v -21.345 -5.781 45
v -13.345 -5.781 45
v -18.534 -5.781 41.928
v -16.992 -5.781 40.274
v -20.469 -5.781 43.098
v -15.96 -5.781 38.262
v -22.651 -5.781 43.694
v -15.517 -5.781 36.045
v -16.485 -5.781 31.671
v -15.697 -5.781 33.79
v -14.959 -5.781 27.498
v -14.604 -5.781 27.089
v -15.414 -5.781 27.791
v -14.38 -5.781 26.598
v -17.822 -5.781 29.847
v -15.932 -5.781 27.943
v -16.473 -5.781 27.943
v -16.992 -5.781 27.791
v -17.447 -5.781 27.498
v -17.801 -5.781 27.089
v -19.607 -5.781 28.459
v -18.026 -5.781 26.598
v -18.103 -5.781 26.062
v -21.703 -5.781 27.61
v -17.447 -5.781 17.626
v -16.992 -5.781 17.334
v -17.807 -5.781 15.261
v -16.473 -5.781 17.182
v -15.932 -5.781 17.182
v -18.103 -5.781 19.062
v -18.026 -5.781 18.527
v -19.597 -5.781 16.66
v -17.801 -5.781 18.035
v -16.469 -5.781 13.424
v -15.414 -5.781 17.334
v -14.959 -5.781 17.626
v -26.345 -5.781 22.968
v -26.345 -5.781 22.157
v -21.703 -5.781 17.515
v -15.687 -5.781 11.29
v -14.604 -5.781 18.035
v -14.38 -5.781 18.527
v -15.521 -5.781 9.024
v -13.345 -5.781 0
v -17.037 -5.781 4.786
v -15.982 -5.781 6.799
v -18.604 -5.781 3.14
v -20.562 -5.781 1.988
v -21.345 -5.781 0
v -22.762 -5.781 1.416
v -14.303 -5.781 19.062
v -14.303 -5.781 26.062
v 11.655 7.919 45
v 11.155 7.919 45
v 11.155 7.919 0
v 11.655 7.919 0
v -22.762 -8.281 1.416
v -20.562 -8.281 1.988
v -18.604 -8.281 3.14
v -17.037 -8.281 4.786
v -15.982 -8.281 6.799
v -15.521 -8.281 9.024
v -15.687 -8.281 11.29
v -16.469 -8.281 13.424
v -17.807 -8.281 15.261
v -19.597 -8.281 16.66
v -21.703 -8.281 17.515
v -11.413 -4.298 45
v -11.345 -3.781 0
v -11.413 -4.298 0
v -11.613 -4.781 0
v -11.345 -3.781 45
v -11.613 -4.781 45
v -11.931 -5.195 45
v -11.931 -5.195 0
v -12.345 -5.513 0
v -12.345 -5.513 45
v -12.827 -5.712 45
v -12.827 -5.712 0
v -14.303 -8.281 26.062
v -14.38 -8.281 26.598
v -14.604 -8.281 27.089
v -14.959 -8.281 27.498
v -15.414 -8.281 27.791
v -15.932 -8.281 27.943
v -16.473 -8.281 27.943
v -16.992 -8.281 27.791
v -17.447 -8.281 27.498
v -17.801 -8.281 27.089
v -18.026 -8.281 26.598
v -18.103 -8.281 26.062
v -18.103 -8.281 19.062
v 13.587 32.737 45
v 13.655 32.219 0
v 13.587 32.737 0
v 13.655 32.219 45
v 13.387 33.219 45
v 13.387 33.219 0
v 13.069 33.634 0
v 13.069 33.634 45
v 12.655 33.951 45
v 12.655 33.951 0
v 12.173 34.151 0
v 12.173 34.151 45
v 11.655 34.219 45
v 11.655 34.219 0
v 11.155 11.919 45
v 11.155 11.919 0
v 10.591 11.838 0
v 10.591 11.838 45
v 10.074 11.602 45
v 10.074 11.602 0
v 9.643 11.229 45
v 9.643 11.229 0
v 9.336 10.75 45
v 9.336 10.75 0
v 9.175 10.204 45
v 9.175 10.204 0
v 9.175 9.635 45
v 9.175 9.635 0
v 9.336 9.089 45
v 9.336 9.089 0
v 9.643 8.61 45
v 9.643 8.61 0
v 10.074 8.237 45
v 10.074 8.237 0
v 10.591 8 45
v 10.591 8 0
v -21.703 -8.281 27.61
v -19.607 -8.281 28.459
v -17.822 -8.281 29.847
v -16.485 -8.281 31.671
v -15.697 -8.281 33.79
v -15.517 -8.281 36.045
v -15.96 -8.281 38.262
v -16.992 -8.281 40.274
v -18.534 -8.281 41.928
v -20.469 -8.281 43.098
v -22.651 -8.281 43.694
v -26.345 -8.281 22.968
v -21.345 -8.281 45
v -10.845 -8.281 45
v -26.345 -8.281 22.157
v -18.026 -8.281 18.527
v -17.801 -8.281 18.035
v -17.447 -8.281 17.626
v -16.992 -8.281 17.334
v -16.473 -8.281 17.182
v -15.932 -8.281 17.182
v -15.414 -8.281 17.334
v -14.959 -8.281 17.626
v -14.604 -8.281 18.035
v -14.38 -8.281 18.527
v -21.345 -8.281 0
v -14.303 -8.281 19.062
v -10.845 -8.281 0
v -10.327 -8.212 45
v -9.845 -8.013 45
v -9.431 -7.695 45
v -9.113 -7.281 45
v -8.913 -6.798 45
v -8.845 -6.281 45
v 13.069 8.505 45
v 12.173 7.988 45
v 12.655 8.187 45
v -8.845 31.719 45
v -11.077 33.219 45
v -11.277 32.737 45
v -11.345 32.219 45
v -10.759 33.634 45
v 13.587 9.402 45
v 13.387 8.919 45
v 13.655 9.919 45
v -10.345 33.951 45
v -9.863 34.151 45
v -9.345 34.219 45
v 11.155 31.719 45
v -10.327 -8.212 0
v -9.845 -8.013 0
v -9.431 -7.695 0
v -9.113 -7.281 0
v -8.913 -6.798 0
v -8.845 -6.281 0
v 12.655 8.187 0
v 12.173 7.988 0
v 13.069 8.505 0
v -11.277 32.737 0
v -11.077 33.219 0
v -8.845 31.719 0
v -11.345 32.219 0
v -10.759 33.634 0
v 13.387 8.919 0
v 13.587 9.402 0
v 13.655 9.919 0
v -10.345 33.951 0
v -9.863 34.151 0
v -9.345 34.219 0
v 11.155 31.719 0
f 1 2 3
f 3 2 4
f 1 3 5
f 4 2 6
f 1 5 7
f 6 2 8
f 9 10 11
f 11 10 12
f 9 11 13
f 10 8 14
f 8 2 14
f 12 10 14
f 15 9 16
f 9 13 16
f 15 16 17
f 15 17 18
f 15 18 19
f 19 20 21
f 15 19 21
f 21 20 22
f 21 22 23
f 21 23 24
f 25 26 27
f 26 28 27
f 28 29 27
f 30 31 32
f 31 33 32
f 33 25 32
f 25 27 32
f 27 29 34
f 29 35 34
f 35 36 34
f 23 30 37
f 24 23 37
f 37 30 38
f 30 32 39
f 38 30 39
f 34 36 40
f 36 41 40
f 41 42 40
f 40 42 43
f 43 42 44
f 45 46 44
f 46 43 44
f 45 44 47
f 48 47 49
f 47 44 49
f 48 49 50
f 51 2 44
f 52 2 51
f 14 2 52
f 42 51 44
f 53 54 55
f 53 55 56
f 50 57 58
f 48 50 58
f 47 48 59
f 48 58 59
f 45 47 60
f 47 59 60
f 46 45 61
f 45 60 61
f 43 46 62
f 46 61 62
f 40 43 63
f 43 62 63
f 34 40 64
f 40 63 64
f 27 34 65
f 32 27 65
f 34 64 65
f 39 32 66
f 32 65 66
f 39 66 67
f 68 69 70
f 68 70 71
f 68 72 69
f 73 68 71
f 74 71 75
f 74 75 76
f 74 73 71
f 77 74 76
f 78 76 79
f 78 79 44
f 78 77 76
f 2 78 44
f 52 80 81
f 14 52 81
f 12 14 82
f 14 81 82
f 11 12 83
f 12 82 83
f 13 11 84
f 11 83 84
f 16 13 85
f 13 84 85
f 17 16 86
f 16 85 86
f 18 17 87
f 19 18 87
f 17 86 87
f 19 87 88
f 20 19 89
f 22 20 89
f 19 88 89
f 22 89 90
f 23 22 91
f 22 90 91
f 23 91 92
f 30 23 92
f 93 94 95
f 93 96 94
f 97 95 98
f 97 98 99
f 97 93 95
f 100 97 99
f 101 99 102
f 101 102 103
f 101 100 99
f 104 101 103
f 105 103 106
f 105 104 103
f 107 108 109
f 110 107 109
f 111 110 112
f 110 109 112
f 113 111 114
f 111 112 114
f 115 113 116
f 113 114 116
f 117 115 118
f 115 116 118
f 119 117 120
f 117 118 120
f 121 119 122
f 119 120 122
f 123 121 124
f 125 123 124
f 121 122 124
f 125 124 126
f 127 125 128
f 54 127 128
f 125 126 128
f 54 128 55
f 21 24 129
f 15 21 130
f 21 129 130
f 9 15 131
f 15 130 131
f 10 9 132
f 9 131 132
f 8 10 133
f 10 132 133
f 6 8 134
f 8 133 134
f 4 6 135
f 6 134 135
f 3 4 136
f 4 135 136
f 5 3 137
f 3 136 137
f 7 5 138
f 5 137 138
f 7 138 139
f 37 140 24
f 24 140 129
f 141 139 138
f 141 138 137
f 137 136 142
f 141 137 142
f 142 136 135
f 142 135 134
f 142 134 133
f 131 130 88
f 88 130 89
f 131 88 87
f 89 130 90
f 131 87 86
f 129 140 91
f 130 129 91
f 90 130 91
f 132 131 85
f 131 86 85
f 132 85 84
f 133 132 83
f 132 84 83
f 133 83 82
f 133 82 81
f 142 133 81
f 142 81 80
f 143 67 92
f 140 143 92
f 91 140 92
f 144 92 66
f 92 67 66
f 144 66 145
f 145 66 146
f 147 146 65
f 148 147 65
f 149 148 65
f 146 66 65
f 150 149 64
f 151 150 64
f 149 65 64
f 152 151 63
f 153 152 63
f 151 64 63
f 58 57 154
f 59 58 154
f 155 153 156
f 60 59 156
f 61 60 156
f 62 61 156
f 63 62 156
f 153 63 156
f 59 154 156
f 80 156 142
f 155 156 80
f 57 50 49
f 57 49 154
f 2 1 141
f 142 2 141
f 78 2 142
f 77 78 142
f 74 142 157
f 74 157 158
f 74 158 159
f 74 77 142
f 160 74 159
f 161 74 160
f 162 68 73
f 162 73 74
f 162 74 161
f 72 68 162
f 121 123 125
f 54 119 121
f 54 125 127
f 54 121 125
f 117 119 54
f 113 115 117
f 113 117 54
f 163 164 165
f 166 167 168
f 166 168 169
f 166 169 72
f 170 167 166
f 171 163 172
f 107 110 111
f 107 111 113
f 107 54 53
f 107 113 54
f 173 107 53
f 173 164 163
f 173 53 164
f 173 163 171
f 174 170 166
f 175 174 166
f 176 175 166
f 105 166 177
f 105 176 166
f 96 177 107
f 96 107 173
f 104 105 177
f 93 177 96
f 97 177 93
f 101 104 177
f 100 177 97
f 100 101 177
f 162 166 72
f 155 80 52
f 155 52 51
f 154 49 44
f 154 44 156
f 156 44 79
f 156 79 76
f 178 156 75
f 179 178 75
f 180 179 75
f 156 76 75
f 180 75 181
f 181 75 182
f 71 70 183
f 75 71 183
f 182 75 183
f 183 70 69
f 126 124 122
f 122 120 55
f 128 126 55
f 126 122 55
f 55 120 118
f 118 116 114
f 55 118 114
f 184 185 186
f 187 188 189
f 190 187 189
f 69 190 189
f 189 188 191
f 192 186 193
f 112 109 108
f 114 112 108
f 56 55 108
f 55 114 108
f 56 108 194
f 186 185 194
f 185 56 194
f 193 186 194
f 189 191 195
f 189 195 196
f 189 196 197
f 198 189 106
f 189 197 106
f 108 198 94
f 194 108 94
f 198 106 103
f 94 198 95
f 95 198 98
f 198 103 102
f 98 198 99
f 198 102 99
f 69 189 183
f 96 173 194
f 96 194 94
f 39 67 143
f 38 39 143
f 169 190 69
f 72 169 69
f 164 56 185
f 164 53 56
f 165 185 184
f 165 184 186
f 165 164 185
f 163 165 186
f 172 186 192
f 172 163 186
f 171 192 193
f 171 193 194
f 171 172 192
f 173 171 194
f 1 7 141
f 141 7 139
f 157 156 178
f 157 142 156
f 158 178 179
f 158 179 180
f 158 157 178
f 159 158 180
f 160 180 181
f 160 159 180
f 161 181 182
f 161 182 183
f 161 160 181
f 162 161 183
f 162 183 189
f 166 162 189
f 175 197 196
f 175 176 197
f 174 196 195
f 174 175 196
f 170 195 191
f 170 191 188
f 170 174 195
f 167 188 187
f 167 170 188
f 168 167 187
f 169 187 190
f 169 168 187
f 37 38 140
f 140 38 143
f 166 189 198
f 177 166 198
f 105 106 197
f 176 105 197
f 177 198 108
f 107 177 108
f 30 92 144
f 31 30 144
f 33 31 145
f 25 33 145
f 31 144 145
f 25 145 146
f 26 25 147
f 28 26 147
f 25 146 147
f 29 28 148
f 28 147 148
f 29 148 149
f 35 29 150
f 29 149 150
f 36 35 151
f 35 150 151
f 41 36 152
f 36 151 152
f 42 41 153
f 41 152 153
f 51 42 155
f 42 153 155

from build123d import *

# Parameters (mm, degrees)
PAD_DEPTH       = 45
FILLET_R        = 2
CHAMFER_SIZE    = 5
SKETCH001_R     = 1.8
POCKET_DEPTH    = 5
POCKET001_DEPTH = 5


with BuildPart() as part:
    # Sketch → Pad (new body)
    with BuildSketch(Plane.XY):
        with BuildLine():
            Line((11.154947, 7.919356), (13.654947, 7.919356))
            Line((13.654947, 7.919356), (13.654947, 34.219356))
            Line((13.654947, 34.219356), (-11.345053, 34.219356))
            Line((-11.345053, 34.219356), (-11.345053, -5.780644))
            Line((-11.345053, -5.780644), (-26.345053, -5.780644))
            Line((-26.345053, -5.780644), (-26.345053, -8.280644))
            Line((-26.345053, -8.280644), (-8.845053, -8.280644))
            Line((-8.845053, -8.280644), (-8.845053, 31.719356))
            Line((-8.845053, 31.719356), (11.154947, 31.719356))
            Line((11.154947, 31.719356), (11.154947, 11.919356))
            ThreePointArc((11.154947, 11.919356), (9.154947, 9.919356), (11.154947, 7.919356))
        make_face()
    extrude(amount=PAD_DEPTH)

    # Fillet
    fillet_edges = [part.edges().sort_by_distance(p)[0] for p in [
        (-8.845053, -8.280644, 22.5),
        (-11.345053, -5.780644, 22.5),
        (-11.345053, 34.219356, 22.5),
        (13.654947, 34.219356, 22.5),
        (13.654947, 7.919356, 22.5),
    ]]
    fillet(fillet_edges, radius=FILLET_R)

    # Chamfer
    chamfer_edges = [part.edges().sort_by_distance(p)[0] for p in [
        (-26.345053, -7.030644, 0),
        (-26.345053, -7.030644, 45),
    ]]
    chamfer(chamfer_edges, length=CHAMFER_SIZE)

    # Sketch001 (on Face2 of Chamfer) → Pocket (cut)
    with BuildSketch(Plane.XZ.offset(8.280644)):
        with Locations((-20.345053, 4.25)):
            Circle(SKETCH001_R)
        with Locations((-20.345053, 40.75)):
            Circle(SKETCH001_R)
    extrude(amount=-POCKET_DEPTH, mode=Mode.SUBTRACT)

    # Sketch002 (on Face2 of Pocket) → Pocket001 (cut)
    with BuildSketch(Plane.XZ.offset(8.280644)):
        with BuildLine():
            ThreePointArc((-23.702854, 1.362278), (-15.565, 8.554641), (-21.702854, 17.514636))
            Line((-21.702854, 17.514636), (-26.750495, 22.562278))
            Line((-26.750495, 22.562278), (-21.702854, 27.60992))
            ThreePointArc((-21.702854, 27.60992), (-15.565, 36.569915), (-23.702854, 43.762278))
            Line((-23.702854, 43.762278), (-32.41938, 43.762278))
            Line((-32.41938, 43.762278), (-32.41938, 1.362278))
            Line((-32.41938, 1.362278), (-23.702854, 1.362278))
        make_face()
        with BuildLine():
            ThreePointArc((-14.302854, 26.062278), (-16.202854, 27.962278), (-18.102854, 26.062278))
            Line((-18.102854, 26.062278), (-18.102854, 19.062278))
            ThreePointArc((-18.102854, 19.062278), (-16.202854, 17.162278), (-14.302854, 19.062278))
            Line((-14.302854, 26.062278), (-14.302854, 19.062278))
        make_face()
    extrude(amount=-POCKET001_DEPTH, mode=Mode.SUBTRACT)


solid = part.part
